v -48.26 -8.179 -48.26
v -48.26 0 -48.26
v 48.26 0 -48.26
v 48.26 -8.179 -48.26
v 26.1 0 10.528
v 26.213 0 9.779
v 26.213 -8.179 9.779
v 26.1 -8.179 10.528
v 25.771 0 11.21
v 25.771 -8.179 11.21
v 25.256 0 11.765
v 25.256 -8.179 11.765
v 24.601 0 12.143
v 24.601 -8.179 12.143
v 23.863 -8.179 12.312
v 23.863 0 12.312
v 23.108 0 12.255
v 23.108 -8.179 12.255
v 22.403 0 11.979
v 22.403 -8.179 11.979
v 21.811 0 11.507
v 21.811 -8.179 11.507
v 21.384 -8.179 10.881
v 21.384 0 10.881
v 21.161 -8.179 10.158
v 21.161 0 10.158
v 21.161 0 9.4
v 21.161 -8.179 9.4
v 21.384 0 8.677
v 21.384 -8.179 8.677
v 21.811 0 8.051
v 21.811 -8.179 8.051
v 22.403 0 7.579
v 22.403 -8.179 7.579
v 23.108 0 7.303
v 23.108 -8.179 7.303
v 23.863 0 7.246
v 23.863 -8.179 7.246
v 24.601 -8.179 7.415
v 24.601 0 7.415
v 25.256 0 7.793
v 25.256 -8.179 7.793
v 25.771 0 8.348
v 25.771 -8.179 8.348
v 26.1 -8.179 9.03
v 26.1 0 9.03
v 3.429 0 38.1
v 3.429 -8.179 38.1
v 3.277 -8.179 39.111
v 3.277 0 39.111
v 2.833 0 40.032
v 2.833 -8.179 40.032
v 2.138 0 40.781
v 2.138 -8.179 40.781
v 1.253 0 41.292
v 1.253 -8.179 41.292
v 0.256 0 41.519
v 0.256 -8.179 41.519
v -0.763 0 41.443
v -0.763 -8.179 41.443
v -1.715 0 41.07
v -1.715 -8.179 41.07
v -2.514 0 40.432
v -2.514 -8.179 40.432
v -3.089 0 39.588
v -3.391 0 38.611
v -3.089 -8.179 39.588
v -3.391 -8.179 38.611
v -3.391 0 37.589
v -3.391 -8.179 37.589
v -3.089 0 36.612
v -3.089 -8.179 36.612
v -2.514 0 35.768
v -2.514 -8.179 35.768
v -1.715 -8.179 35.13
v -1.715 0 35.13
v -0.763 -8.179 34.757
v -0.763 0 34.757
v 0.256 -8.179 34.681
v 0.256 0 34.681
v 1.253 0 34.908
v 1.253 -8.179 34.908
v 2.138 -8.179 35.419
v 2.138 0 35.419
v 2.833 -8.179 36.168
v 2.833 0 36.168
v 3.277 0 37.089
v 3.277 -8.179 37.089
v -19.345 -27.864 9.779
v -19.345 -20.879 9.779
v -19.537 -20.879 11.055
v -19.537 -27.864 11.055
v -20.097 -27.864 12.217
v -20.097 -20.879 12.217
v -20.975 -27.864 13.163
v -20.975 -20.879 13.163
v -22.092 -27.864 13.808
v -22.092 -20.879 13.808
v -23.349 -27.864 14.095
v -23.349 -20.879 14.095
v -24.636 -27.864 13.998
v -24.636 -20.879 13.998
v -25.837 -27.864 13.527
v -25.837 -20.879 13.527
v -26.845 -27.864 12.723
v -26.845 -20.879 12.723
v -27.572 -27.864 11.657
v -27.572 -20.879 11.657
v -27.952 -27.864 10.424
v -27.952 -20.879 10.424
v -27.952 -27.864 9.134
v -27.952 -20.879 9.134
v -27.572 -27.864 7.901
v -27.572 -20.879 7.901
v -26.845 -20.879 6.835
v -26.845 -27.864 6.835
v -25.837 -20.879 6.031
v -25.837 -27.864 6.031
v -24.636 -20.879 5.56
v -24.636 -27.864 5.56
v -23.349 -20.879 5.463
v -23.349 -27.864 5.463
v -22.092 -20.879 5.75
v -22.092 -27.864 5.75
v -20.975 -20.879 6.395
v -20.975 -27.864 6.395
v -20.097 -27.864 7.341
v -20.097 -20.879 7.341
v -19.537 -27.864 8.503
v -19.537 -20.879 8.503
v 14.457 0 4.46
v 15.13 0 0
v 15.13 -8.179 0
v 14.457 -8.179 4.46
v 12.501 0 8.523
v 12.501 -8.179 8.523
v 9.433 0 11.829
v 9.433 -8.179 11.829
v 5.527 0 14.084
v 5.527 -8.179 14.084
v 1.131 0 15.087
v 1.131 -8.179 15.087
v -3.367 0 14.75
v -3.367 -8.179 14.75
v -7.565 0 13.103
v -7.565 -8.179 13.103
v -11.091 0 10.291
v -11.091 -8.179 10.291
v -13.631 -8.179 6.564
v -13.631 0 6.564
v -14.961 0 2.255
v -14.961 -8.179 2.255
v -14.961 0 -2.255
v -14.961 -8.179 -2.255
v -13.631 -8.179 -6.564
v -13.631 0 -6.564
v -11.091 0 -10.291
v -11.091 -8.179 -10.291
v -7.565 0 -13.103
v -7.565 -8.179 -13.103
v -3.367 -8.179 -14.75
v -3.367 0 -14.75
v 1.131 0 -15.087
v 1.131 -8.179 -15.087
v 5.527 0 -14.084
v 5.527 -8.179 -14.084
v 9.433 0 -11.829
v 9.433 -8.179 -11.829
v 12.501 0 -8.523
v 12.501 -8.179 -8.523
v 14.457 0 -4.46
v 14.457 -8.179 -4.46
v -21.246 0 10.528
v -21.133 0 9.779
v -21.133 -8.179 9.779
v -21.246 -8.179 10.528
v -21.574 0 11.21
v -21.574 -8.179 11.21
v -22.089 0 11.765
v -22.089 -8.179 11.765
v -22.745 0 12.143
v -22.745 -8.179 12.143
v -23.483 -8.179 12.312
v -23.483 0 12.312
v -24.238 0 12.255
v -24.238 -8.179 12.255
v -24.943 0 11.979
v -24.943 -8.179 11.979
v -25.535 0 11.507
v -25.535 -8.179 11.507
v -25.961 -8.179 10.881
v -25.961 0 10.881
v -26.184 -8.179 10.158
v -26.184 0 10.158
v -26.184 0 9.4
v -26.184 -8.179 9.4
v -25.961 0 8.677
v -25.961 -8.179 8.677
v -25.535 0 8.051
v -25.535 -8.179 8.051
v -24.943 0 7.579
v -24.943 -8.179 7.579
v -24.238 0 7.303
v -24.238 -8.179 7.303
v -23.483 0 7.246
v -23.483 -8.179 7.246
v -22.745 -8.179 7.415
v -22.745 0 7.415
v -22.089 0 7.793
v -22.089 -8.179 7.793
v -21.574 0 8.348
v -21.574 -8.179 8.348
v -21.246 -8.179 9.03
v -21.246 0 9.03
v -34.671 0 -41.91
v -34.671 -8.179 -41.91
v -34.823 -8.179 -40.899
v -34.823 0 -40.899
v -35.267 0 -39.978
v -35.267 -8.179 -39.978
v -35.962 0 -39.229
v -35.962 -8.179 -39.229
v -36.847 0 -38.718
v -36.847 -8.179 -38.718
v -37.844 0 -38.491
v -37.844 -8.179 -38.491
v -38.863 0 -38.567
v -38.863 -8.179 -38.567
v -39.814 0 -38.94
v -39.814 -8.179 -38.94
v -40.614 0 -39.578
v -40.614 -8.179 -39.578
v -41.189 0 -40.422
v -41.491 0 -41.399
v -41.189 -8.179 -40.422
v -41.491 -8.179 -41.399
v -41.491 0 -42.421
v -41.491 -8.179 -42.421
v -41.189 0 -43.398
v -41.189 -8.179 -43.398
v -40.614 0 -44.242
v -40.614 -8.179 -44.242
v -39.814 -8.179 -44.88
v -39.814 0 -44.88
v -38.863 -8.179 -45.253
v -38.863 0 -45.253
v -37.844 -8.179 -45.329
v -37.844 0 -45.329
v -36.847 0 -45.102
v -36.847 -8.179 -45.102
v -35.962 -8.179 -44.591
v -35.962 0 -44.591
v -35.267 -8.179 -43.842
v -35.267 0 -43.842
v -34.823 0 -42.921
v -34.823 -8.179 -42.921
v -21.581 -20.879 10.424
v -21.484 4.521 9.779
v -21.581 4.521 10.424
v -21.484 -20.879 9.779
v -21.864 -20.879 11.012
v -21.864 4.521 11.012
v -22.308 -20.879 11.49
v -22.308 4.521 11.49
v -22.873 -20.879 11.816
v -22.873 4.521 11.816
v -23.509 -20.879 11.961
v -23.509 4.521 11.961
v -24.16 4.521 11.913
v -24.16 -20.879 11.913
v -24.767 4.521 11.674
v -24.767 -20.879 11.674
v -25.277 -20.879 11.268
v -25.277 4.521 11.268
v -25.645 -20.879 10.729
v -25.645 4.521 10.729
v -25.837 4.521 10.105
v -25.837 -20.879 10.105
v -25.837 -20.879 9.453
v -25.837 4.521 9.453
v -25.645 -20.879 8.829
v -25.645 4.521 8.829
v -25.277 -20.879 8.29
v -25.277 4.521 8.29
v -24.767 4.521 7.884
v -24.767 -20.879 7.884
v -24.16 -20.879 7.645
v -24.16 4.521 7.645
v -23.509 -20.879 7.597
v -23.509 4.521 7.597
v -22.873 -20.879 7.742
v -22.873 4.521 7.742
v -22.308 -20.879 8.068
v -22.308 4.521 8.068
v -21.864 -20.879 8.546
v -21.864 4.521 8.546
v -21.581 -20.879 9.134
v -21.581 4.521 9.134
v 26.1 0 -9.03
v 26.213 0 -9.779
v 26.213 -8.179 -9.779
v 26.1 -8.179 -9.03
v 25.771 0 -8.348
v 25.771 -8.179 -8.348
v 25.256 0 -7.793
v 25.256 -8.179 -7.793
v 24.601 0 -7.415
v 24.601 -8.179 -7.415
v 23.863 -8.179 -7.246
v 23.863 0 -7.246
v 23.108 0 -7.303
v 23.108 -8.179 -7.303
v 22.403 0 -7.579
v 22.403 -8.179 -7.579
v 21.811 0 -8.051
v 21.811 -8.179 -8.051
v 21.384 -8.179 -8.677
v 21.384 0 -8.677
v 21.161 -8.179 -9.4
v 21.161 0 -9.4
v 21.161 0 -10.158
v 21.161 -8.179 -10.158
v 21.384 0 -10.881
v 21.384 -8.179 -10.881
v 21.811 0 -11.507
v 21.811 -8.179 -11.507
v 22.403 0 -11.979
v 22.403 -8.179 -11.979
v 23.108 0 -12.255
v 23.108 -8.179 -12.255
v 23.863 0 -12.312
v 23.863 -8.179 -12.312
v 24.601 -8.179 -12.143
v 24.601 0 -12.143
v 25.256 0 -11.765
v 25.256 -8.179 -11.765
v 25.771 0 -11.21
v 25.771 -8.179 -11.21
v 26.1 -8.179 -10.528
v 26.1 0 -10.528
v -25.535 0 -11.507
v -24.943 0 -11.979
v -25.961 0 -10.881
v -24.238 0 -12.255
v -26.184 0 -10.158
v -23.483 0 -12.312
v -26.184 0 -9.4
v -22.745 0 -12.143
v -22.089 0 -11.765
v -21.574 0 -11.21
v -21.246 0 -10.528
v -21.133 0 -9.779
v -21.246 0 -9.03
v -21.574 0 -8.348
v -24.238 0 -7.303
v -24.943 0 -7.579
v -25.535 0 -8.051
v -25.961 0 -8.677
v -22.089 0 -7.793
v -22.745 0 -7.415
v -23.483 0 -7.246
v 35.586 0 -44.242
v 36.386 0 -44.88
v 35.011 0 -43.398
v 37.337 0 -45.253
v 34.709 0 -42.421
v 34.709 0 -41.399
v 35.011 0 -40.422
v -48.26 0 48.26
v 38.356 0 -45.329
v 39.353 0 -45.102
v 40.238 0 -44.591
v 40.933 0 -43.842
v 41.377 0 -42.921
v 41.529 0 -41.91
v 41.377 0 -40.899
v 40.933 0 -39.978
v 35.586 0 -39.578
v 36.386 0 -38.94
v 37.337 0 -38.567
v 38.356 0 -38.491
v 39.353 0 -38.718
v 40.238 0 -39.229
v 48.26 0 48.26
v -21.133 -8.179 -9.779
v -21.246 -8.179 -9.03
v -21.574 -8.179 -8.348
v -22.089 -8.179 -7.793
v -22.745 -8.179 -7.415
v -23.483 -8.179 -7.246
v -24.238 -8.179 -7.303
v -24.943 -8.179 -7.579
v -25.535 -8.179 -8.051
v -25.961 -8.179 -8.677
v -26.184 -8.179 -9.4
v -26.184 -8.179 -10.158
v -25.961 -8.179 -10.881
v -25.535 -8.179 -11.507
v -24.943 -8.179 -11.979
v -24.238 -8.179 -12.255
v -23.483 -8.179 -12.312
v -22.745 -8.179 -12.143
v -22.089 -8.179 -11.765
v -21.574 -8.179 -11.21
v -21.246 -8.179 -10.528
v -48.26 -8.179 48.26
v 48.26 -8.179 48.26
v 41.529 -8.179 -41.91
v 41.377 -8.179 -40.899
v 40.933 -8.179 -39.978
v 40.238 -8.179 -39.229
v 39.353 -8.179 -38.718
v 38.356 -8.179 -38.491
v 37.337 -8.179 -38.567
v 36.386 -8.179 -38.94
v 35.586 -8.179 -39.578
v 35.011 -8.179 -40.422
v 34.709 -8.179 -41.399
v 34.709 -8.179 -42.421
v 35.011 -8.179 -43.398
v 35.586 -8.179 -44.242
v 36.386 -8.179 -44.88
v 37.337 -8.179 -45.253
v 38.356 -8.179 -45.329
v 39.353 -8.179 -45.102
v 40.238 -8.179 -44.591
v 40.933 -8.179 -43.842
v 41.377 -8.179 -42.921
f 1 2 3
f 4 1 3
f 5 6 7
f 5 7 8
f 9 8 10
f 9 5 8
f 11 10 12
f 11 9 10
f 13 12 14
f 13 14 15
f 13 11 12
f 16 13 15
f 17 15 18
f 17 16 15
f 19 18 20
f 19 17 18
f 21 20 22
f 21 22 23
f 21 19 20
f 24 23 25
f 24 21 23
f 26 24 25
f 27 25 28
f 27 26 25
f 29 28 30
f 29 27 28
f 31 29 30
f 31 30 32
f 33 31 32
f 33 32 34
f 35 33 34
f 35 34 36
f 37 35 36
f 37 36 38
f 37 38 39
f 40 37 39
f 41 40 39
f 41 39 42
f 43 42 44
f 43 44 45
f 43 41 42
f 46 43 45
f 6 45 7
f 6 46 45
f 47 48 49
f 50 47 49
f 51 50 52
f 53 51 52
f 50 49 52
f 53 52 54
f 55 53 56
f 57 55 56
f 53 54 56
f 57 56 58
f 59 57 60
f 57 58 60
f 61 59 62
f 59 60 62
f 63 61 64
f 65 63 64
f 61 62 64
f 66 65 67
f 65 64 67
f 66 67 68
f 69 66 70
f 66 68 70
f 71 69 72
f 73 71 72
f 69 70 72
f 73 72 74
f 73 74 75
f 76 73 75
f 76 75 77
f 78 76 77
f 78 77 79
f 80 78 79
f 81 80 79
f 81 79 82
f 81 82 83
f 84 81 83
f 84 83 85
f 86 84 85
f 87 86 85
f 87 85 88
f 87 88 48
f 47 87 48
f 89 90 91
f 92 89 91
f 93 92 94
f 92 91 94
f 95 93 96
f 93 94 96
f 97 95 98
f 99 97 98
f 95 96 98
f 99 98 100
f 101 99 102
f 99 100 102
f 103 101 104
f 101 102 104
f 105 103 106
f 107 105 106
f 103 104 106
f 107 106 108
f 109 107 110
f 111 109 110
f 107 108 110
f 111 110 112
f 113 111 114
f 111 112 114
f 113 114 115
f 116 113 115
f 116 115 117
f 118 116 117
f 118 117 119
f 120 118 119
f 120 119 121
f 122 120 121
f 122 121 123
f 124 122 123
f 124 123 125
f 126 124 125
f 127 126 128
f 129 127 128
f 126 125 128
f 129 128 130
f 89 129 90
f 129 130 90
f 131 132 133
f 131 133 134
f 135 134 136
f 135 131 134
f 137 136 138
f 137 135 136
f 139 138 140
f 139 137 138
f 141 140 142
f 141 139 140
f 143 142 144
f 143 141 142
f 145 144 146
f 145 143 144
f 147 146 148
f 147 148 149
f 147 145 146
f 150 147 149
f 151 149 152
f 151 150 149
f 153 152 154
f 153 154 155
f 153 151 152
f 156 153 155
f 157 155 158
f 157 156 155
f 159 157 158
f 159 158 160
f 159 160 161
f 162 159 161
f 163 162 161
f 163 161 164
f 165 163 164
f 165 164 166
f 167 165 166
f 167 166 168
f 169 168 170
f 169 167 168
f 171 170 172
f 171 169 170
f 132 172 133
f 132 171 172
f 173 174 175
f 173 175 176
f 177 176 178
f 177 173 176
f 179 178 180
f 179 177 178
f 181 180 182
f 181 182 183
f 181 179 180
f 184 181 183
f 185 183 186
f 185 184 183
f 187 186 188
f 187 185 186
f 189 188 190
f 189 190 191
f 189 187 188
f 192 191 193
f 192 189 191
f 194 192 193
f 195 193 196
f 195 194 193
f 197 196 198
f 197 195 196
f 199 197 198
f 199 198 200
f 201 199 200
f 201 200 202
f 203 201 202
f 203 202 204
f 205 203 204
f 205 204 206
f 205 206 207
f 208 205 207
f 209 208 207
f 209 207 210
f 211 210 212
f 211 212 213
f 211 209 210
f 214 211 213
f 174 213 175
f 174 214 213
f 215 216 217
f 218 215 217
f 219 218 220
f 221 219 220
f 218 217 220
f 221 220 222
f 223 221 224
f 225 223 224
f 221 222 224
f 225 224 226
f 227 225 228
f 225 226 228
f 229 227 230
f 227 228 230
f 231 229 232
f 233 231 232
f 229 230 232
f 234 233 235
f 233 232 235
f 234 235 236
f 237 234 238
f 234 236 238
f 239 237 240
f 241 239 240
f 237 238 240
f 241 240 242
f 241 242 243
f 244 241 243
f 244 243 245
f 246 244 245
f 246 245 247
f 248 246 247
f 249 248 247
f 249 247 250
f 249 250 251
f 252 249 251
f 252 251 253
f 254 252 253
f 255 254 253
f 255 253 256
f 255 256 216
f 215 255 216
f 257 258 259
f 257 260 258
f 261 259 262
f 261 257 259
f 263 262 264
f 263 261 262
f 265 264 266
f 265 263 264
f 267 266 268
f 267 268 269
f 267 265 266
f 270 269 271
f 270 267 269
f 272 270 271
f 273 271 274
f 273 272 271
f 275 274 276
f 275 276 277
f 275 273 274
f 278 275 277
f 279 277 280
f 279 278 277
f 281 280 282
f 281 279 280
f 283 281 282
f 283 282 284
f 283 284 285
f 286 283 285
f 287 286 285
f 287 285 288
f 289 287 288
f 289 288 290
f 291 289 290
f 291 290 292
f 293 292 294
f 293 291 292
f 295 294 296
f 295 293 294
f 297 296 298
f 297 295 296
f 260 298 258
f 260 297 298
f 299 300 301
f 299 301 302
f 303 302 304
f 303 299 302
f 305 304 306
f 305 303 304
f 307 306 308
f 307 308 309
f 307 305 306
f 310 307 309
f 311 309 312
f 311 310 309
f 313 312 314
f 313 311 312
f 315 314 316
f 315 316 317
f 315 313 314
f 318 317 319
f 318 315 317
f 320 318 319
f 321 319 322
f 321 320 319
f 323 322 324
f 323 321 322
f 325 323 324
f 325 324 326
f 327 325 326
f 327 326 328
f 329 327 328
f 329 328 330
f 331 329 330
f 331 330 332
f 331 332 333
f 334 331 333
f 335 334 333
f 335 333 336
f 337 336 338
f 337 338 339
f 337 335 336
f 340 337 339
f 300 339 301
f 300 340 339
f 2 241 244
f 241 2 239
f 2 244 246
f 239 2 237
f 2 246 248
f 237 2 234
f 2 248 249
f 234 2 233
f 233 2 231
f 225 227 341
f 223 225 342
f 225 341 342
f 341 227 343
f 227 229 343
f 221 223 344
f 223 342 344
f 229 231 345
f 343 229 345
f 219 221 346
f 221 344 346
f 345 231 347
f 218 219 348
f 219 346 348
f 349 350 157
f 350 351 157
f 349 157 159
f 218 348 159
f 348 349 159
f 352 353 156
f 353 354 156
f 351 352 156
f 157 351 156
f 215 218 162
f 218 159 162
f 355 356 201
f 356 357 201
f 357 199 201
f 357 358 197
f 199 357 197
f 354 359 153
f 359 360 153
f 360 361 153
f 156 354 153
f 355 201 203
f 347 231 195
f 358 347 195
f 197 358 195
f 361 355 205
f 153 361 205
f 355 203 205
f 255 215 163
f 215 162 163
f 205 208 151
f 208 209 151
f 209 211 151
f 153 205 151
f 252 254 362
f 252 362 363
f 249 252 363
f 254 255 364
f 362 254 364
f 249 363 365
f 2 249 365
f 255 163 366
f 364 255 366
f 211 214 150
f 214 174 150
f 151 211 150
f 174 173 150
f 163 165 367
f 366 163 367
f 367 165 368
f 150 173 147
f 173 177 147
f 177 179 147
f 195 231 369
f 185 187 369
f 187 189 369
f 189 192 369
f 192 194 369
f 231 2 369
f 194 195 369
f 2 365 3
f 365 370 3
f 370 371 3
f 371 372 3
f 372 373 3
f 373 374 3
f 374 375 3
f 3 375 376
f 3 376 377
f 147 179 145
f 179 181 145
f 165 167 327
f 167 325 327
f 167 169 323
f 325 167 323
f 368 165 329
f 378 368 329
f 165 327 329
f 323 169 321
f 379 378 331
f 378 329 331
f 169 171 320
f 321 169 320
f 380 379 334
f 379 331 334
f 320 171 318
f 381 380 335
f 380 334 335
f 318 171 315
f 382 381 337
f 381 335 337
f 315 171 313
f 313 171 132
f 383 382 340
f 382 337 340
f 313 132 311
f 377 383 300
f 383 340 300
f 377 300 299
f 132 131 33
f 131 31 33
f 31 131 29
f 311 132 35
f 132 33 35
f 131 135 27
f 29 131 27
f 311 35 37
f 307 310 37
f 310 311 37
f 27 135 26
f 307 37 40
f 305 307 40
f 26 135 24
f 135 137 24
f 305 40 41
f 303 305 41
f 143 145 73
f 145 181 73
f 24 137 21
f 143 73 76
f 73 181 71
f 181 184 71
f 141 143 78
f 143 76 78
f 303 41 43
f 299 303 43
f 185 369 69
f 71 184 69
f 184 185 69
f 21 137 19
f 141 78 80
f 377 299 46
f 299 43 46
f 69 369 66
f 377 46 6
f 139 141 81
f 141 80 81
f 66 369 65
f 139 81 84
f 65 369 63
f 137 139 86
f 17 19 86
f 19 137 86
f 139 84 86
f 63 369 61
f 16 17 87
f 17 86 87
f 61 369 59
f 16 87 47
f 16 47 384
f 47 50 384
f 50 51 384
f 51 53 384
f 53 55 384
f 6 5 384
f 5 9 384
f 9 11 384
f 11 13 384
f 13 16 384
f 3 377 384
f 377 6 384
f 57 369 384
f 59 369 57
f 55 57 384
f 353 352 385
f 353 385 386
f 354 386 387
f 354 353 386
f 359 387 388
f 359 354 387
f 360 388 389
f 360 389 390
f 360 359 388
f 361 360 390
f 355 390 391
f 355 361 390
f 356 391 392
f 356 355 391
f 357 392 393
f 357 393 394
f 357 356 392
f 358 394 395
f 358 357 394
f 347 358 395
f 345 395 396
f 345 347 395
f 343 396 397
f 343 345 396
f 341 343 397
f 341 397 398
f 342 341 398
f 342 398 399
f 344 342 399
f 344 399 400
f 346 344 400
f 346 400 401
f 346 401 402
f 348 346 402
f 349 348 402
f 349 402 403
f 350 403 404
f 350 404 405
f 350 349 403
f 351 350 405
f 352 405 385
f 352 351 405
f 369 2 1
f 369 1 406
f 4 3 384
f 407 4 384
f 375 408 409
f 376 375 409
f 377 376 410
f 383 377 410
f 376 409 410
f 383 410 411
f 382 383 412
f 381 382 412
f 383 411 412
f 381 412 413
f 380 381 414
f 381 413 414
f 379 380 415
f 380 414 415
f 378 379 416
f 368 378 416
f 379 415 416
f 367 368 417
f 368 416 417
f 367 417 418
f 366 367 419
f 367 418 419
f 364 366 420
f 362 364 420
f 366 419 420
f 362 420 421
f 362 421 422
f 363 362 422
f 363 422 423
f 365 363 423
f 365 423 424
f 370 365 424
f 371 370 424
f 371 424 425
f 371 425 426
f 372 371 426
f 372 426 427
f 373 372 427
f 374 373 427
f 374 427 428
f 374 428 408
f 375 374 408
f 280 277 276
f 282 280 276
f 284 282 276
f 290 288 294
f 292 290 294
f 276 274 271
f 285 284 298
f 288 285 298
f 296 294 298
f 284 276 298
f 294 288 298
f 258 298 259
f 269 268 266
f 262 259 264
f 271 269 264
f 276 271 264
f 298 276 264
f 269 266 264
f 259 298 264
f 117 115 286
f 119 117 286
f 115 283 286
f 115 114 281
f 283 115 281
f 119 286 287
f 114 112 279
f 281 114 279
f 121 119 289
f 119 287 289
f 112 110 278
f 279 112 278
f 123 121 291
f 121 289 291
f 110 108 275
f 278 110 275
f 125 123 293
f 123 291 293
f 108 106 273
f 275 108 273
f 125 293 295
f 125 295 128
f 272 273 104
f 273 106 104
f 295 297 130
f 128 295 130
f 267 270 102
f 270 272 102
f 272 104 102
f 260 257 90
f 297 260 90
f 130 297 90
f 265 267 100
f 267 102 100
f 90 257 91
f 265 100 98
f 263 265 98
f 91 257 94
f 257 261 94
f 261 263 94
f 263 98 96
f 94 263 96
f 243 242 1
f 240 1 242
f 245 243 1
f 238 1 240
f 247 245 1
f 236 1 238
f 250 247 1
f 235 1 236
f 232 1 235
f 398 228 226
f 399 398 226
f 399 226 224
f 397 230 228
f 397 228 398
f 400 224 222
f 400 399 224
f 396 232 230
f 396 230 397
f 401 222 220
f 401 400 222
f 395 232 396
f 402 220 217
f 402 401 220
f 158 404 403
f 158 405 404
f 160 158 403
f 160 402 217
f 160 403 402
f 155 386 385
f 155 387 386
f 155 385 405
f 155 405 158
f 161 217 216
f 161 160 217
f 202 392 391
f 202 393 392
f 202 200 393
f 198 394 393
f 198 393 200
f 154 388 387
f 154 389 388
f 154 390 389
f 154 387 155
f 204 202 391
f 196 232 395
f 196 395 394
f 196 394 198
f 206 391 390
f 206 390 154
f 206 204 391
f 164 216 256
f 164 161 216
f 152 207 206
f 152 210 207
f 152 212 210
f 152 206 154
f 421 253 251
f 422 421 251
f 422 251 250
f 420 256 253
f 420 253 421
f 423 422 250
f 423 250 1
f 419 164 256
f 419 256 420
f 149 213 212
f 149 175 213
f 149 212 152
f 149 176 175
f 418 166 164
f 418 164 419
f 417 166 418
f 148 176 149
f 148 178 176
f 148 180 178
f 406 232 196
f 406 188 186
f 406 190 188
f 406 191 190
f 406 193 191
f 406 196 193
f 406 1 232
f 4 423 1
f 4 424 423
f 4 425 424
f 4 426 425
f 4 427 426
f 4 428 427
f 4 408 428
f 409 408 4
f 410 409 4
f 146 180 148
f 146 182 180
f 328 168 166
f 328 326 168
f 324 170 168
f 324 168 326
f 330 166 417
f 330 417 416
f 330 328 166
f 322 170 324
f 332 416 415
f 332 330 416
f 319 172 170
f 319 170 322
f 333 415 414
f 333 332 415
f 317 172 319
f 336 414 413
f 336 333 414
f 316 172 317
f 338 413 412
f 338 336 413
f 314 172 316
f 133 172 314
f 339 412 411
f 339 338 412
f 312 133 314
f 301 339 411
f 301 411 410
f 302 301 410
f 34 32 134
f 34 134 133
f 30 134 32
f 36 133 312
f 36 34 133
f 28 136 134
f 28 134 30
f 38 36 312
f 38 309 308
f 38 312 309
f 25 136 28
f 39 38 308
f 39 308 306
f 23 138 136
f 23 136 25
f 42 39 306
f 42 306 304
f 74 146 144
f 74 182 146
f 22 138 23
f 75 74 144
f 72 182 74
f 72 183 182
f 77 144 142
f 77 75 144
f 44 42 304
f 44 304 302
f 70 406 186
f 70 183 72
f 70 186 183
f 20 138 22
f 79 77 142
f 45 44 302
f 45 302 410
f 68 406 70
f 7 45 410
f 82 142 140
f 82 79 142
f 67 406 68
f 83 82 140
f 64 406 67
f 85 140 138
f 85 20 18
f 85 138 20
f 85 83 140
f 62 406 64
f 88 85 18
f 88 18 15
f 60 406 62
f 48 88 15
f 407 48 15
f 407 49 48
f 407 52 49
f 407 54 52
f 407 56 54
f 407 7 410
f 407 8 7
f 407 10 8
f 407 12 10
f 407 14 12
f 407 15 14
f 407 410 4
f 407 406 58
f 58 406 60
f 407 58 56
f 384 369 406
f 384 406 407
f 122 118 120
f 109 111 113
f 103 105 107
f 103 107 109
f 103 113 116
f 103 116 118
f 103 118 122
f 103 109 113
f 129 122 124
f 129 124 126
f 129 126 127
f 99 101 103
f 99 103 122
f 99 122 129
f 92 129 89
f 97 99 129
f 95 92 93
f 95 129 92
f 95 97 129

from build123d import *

# Parameters (mm, degrees)
F0_W     = 96.52
F0_H     = 96.52
F0_R     = 2.54
F0_R_2   = 15.129575
F1_DEPTH = 8.1788
F2_R     = 3.429
F3_DEPTH = 8.1798
F4_R     = 2.188597
F5_DEPTH = 12.7
F6_R     = 4.327678
F7_DEPTH = 6.985


with BuildPart() as f1:
    # F0 (on Front) → F1 (new body)
    with BuildSketch(Plane.XZ):
        Rectangle(F0_W, F0_H)
        with Locations((-23.6728, -9.779)):
            Circle(F0_R, mode=Mode.SUBTRACT)
        with Locations((23.6728, -9.779)):
            Circle(F0_R, mode=Mode.SUBTRACT)
        with Locations((-23.6728, 9.779)):
            Circle(F0_R, mode=Mode.SUBTRACT)
        Circle(F0_R_2, mode=Mode.SUBTRACT)
        with Locations((23.6728, 9.779)):
            Circle(F0_R, mode=Mode.SUBTRACT)
    extrude(amount=F1_DEPTH)

    # F2 (on face) → F3 (cut, through all)
    with BuildSketch(Plane.XZ.offset(8.1788)):
        with Locations((0, 38.1)):
            Circle(F2_R)
        with Locations((38.1, -41.91)):
            Circle(F2_R)
        with Locations((-38.1, -41.91)):
            Circle(F2_R)
    extrude(amount=-F3_DEPTH, mode=Mode.SUBTRACT)


with BuildPart() as f5:
    # F4 (on face) → F5 (new body, symmetric)
    with BuildSketch(Plane.XZ.offset(8.1788)):
        with Locations((-23.6728, 9.779)):
            Circle(F4_R)
    extrude(amount=F5_DEPTH, both=True)

    # F6 (on face) → F7 (join)
    with BuildSketch(Plane.XZ.offset(20.8788)):
        with Locations((-23.6728, 9.779)):
            Circle(F6_R)
    extrude(amount=F7_DEPTH)


solid = Compound([f1.part, f5.part])
